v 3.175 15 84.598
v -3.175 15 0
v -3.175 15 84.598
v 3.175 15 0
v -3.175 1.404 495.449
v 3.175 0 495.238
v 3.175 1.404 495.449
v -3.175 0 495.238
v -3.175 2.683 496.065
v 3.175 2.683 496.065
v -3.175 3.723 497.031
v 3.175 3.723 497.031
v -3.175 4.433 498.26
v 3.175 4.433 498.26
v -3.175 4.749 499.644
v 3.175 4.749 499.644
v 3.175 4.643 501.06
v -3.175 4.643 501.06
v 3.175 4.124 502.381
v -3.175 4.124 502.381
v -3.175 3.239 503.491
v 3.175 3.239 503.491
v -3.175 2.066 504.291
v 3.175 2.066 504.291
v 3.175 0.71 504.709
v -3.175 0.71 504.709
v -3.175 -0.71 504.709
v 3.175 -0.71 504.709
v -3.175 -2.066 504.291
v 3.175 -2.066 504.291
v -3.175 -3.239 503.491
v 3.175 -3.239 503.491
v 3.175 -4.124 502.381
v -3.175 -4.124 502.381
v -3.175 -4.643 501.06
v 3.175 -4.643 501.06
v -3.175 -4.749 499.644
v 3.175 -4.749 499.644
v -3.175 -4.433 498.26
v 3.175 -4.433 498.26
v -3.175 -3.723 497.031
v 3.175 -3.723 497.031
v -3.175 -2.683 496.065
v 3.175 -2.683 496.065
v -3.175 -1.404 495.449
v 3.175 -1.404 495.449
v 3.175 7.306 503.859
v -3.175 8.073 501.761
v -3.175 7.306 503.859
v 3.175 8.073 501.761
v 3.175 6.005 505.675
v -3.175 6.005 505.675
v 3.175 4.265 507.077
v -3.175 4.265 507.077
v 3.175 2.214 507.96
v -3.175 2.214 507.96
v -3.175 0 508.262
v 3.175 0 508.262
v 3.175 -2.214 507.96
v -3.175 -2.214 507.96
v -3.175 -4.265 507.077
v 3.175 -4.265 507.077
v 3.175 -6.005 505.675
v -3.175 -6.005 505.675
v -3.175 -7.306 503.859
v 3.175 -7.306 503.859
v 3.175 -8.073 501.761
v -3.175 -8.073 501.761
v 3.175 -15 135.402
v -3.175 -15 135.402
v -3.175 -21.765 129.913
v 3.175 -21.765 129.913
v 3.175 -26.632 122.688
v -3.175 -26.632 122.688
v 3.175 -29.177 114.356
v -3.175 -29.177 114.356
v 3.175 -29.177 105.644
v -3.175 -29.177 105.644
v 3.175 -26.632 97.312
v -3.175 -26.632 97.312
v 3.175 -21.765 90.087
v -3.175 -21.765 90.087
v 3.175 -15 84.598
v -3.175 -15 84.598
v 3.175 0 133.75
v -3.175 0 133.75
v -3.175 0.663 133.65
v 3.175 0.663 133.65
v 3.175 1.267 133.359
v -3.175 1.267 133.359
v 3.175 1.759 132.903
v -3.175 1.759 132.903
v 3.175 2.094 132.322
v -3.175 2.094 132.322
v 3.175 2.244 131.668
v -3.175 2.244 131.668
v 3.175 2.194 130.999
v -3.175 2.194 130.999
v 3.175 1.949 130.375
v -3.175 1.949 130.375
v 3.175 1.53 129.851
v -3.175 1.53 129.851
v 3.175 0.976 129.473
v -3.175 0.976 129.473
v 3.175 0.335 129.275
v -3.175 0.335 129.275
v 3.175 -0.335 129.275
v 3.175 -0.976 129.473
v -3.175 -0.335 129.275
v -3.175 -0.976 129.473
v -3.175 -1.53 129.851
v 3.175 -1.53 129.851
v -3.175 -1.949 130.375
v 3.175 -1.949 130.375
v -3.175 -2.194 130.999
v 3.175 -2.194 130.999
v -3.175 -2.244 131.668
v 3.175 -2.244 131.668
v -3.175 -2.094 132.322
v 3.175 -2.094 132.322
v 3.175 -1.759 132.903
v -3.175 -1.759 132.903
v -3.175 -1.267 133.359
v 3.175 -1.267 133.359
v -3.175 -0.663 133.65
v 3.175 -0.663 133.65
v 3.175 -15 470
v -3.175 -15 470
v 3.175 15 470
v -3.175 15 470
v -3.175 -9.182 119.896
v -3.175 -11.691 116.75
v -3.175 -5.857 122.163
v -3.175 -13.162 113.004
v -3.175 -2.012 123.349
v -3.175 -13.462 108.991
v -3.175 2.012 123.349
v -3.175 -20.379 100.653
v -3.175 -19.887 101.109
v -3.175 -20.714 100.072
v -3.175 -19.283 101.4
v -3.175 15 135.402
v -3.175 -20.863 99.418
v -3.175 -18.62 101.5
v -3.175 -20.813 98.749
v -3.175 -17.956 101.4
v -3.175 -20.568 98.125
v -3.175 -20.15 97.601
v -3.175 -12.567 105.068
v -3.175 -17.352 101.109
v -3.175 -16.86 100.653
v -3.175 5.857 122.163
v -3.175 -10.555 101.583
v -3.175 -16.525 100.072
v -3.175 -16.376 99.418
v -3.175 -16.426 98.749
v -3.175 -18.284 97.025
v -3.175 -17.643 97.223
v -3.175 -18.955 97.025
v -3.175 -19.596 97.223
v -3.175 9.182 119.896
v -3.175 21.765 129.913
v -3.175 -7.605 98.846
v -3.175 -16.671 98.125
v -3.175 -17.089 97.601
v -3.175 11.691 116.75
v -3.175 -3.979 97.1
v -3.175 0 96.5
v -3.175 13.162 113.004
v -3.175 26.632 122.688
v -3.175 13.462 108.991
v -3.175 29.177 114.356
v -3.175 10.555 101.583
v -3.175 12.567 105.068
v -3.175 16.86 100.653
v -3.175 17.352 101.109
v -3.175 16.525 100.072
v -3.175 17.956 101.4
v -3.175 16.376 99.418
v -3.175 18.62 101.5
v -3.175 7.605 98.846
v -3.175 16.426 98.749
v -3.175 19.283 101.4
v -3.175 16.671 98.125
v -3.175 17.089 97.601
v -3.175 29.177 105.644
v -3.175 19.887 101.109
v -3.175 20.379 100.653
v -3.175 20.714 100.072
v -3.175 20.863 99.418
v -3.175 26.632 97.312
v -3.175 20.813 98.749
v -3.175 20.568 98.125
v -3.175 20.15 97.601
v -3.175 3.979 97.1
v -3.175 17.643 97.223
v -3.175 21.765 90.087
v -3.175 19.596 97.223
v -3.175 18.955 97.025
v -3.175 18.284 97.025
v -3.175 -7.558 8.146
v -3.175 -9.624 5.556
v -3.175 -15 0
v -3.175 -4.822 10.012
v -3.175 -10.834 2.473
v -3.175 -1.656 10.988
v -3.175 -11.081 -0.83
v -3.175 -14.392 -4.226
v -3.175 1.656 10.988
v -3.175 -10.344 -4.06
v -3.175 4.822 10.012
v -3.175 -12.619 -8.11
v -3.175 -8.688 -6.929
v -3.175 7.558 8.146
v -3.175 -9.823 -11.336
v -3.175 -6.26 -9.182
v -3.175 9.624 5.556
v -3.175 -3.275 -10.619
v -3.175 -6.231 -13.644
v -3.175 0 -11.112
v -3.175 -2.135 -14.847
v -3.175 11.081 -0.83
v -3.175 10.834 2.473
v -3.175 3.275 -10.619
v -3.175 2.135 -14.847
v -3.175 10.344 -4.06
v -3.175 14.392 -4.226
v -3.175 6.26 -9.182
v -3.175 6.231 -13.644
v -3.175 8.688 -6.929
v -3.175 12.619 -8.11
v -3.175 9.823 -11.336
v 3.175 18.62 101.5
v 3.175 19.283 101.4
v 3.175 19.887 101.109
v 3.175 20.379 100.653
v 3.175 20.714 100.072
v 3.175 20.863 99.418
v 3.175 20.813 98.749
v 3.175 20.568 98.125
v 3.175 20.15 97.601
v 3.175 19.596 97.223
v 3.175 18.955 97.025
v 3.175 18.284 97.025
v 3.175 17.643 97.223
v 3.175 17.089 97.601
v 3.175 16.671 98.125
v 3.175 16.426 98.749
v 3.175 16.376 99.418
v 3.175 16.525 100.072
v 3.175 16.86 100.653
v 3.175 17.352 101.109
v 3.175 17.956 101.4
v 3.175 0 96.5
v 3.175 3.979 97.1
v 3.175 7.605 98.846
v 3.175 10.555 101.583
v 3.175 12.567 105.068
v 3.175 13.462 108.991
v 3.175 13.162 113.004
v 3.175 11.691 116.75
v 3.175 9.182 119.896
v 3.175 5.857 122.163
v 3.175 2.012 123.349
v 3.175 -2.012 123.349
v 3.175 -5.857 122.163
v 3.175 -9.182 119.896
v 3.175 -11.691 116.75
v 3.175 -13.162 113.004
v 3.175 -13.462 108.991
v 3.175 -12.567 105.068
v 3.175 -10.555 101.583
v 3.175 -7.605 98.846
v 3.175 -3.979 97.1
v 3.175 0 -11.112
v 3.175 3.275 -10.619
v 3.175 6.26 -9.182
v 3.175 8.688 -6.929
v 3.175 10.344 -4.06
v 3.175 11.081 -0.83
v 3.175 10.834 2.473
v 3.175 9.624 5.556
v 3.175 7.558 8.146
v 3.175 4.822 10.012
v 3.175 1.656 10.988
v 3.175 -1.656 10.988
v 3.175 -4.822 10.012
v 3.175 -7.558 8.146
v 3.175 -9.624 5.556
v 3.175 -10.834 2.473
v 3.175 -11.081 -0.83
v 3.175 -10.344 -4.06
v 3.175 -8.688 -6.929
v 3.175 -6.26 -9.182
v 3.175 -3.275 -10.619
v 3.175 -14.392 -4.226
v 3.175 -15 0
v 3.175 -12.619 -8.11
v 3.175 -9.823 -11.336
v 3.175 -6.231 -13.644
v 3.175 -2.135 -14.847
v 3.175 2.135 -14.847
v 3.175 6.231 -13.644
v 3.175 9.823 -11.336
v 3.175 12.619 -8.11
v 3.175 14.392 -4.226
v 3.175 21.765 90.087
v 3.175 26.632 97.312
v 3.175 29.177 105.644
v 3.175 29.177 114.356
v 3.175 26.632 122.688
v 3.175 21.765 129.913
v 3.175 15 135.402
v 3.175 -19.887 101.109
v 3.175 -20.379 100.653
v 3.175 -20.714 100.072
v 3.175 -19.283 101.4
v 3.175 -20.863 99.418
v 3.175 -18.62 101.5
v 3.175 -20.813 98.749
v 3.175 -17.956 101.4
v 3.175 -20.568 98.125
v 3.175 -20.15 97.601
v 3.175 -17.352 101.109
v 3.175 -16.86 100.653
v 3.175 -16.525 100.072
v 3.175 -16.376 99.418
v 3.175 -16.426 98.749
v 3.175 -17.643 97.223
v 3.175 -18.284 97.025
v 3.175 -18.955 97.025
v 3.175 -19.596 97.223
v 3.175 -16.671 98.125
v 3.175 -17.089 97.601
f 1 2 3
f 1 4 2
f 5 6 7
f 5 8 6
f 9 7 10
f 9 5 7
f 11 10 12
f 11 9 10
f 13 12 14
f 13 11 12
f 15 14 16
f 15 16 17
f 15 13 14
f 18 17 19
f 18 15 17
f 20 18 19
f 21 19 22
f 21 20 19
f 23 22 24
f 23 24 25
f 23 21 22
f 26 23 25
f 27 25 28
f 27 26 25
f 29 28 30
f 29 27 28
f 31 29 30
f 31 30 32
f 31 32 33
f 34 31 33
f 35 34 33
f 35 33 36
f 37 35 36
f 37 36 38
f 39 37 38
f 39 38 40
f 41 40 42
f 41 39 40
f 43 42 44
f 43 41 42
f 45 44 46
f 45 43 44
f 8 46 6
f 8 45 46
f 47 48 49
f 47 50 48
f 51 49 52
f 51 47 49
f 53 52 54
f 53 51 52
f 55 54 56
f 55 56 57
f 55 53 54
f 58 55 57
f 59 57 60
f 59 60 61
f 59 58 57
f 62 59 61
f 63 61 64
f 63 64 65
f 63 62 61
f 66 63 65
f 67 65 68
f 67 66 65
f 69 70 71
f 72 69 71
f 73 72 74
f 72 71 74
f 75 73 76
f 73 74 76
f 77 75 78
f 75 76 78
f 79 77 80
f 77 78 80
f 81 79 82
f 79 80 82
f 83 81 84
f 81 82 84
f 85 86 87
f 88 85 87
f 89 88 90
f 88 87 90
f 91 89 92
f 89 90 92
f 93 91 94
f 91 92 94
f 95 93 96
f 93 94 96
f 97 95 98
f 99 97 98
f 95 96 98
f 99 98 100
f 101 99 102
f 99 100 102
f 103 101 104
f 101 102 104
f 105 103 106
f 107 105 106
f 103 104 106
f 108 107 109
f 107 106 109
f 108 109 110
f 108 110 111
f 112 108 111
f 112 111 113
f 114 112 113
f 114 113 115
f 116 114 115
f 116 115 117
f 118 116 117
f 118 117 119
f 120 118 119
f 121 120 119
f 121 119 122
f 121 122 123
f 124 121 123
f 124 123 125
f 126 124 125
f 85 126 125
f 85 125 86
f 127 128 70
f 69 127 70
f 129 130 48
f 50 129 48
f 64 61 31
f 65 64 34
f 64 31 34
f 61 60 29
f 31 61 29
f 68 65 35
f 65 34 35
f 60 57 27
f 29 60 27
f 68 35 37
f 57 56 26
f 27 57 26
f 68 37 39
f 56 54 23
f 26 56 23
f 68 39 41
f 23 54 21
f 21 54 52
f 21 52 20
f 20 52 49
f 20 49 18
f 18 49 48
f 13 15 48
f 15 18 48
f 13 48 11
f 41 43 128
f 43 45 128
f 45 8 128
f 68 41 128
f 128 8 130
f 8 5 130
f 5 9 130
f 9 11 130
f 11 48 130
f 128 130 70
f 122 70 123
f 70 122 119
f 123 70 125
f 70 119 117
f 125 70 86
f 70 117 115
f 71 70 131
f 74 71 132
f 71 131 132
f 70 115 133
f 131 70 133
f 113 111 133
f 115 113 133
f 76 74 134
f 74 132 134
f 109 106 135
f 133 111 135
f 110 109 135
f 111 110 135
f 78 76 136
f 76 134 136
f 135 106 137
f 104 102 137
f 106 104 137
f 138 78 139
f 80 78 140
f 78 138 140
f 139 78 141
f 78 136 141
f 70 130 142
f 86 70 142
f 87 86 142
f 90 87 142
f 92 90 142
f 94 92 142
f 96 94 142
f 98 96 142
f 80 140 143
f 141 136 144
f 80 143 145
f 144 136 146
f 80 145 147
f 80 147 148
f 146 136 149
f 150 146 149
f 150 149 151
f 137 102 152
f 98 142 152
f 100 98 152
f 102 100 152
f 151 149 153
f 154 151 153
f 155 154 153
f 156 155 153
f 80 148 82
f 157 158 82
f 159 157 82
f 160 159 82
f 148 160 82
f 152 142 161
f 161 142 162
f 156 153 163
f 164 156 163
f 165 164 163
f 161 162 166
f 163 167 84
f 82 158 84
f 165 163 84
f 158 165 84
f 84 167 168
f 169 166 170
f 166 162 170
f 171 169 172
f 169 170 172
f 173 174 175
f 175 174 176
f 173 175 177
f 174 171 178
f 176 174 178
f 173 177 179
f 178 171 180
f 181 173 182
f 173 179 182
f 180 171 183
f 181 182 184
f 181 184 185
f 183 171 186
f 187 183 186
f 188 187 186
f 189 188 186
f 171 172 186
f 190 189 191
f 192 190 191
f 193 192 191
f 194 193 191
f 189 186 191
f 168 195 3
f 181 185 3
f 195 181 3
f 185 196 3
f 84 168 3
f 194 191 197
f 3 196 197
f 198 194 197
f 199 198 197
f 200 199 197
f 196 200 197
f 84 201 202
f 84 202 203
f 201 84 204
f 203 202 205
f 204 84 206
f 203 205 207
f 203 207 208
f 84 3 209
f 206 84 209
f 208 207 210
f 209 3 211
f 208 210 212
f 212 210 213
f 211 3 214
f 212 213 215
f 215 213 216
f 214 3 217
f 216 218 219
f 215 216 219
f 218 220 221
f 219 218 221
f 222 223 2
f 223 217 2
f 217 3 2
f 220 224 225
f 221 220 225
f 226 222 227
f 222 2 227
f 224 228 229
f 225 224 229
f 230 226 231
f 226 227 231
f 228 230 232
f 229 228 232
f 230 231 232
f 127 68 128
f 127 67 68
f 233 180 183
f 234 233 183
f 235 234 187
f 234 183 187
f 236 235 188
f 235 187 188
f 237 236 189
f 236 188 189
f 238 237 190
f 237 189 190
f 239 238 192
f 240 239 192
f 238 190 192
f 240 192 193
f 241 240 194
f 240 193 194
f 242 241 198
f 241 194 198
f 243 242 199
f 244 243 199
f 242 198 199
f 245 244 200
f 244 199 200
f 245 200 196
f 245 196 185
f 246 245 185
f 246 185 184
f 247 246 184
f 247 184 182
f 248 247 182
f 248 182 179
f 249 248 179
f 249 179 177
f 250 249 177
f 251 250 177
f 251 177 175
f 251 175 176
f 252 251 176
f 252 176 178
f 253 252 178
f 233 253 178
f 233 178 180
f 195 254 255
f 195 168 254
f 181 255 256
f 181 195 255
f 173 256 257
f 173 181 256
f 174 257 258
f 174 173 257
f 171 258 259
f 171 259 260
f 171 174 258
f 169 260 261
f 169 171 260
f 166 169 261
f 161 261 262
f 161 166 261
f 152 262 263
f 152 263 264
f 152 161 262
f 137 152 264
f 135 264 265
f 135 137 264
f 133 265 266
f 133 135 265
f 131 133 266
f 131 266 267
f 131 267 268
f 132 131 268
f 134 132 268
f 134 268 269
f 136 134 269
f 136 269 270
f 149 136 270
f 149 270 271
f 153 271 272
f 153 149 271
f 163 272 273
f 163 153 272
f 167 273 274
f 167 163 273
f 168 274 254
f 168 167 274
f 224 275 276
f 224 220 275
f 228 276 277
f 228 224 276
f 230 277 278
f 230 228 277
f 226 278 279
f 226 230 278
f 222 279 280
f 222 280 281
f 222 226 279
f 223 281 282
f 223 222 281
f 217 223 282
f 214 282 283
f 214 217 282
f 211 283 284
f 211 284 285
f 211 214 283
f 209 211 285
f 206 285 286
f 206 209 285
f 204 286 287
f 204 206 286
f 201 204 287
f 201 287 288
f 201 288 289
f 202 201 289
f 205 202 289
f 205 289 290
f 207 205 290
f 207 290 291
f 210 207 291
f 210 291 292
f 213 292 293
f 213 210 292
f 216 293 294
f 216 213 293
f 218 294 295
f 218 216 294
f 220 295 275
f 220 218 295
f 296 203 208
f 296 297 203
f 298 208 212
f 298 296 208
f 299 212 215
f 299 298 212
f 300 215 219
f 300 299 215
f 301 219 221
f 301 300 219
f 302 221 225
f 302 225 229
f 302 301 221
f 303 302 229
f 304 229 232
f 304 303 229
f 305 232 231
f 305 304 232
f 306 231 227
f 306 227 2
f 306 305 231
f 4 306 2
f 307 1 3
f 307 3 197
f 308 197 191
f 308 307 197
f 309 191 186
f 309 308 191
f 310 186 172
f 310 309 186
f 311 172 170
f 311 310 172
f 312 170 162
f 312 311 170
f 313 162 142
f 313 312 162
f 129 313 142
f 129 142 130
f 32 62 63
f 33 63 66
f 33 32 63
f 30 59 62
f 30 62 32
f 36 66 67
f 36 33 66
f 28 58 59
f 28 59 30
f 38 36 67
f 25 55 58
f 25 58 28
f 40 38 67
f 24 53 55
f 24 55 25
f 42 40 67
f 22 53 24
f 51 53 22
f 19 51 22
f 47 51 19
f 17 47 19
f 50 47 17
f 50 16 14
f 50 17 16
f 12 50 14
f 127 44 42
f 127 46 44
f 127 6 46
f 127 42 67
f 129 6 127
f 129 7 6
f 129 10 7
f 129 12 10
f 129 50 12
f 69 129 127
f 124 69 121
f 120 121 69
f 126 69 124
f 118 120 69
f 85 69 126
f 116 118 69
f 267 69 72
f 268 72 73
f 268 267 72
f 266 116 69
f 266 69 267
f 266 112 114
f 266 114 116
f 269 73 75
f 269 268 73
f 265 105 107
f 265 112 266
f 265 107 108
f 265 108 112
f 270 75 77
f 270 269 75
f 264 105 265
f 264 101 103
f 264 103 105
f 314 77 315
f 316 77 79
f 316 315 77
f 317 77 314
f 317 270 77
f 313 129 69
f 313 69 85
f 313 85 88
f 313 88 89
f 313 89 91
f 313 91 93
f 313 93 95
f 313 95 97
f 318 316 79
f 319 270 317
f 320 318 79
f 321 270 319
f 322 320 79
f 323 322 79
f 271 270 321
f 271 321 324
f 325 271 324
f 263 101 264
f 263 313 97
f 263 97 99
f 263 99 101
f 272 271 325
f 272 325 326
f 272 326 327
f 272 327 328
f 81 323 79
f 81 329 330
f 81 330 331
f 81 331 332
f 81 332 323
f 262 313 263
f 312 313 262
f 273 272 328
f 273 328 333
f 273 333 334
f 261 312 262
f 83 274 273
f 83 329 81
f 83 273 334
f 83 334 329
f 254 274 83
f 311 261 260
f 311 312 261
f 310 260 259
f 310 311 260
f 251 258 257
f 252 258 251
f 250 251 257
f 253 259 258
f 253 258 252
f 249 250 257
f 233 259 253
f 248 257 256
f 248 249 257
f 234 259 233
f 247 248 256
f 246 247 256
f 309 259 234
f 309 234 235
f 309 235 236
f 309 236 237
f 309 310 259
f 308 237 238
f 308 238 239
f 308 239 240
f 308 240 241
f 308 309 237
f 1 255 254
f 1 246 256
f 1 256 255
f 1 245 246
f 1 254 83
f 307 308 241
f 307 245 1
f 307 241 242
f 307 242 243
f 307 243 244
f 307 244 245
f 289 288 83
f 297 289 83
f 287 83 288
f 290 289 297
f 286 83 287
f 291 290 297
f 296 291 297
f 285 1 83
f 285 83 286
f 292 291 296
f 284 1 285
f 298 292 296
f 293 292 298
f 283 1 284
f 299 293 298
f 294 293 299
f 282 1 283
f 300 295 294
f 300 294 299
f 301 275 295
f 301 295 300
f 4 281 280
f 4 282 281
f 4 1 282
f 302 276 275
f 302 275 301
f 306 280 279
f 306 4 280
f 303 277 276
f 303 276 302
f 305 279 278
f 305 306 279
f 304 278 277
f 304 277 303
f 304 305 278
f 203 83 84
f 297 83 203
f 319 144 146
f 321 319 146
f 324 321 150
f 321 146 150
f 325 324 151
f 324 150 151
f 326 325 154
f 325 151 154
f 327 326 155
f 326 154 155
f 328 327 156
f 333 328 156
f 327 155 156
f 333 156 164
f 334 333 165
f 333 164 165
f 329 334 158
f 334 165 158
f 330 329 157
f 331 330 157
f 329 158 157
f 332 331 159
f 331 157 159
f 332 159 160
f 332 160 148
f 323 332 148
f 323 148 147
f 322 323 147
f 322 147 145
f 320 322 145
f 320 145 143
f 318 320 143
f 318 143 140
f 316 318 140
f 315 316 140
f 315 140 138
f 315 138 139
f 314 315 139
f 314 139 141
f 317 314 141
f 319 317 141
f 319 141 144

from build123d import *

# Parameters (mm, degrees)
SKETCH1_R            = 4.7625
SKETCH1_R_2          = 13.5
SKETCH1_R_3          = 11.1125
BOSS_EXTRUDE1_DEPTH  = 3.175
M4_CLEARANCE_HOLE1_D = 4.5


with BuildPart() as part:
    # Sketch1 → Boss-Extrude1 (new, symmetric)
    # profile 1 of 5: a face of its own
    with BuildSketch(Plane(origin=(0, 0, 0), x_dir=(0, 0, -1), z_dir=(1, 0, 0))):
        with BuildLine():
            Line((-135.401771592, 15), (-470, 15))
            Line((-470, 15), (-501.760727799, 8.072716015))
            ThreePointArc((-501.760727799, 8.072716015), (-508.2625, 0), (-501.760727799, -8.072716015))
            Line((-501.760727799, -8.072716015), (-470, -15))
            Line((-470, -15), (-135.401771592, -15))
            ThreePointArc((-135.401771592, -15), (-139.5, 0), (-135.401771592, 15))
        make_face()
        with Locations((-500, 0)):
            Circle(SKETCH1_R, mode=Mode.SUBTRACT)
    # profile 2 of 5: a face of its own
    with BuildSketch(Plane(origin=(0, 0, 0), x_dir=(0, 0, -1), z_dir=(1, 0, 0))):
        with BuildLine():
            Line((-84.598228408, -15), (-135.401771592, -15))
            ThreePointArc((-135.401771592, -15), (-110, -29.5), (-84.598228408, -15))
        make_face()
    # profile 3 of 5: a face of its own
    with BuildSketch(Plane(origin=(0, 0, 0), x_dir=(0, 0, -1), z_dir=(1, 0, 0))):
        with BuildLine():
            Line((-84.598228408, 15), (-135.401771592, 15))
            ThreePointArc((-135.401771592, 15), (-139.5, 0), (-135.401771592, -15))
            Line((-135.401771592, -15), (-84.598228408, -15))
            ThreePointArc((-84.598228408, -15), (-81.542995046, -7.774887075), (-80.5, 0))
            ThreePointArc((-80.5, 0), (-81.542995046, 7.774887075), (-84.598228408, 15))
        make_face()
        with Locations((-110, 0)):
            Circle(SKETCH1_R_2, mode=Mode.SUBTRACT)
    # profile 4 of 5: a face of its own
    with BuildSketch(Plane(origin=(0, 0, 0), x_dir=(0, 0, -1), z_dir=(1, 0, 0))):
        with BuildLine():
            ThreePointArc((-84.598228408, 15), (-110, 29.5), (-135.401771592, 15))
            Line((-135.401771592, 15), (-84.598228408, 15))
        make_face()
    # profile 5 of 5: a face of its own
    with BuildSketch(Plane(origin=(0, 0, 0), x_dir=(0, 0, -1), z_dir=(1, 0, 0))):
        with BuildLine():
            Line((0, 15), (-84.598228408, 15))
            ThreePointArc((-84.598228408, 15), (-81.542995046, 7.774887075), (-80.5, 0))
            ThreePointArc((-80.5, 0), (-81.542995046, -7.774887075), (-84.598228408, -15))
            Line((-84.598228408, -15), (0, -15))
            ThreePointArc((0, -15), (15, 0), (0, 15))
        make_face()
        Circle(SKETCH1_R_3, mode=Mode.SUBTRACT)
    extrude(amount=BOSS_EXTRUDE1_DEPTH, both=True)

    # M4 Clearance Hole1 (through all)
    with Locations(Plane(origin=(3.175, 0, 0), x_dir=(0, 0, -1), z_dir=(1, 0, 0))):
        with Locations((-110, 0), (-131.5, 0), (-99.25, 18.619546181), (-99.25, -18.619546181)):
            Hole(M4_CLEARANCE_HOLE1_D / 2)


solid = part.part
